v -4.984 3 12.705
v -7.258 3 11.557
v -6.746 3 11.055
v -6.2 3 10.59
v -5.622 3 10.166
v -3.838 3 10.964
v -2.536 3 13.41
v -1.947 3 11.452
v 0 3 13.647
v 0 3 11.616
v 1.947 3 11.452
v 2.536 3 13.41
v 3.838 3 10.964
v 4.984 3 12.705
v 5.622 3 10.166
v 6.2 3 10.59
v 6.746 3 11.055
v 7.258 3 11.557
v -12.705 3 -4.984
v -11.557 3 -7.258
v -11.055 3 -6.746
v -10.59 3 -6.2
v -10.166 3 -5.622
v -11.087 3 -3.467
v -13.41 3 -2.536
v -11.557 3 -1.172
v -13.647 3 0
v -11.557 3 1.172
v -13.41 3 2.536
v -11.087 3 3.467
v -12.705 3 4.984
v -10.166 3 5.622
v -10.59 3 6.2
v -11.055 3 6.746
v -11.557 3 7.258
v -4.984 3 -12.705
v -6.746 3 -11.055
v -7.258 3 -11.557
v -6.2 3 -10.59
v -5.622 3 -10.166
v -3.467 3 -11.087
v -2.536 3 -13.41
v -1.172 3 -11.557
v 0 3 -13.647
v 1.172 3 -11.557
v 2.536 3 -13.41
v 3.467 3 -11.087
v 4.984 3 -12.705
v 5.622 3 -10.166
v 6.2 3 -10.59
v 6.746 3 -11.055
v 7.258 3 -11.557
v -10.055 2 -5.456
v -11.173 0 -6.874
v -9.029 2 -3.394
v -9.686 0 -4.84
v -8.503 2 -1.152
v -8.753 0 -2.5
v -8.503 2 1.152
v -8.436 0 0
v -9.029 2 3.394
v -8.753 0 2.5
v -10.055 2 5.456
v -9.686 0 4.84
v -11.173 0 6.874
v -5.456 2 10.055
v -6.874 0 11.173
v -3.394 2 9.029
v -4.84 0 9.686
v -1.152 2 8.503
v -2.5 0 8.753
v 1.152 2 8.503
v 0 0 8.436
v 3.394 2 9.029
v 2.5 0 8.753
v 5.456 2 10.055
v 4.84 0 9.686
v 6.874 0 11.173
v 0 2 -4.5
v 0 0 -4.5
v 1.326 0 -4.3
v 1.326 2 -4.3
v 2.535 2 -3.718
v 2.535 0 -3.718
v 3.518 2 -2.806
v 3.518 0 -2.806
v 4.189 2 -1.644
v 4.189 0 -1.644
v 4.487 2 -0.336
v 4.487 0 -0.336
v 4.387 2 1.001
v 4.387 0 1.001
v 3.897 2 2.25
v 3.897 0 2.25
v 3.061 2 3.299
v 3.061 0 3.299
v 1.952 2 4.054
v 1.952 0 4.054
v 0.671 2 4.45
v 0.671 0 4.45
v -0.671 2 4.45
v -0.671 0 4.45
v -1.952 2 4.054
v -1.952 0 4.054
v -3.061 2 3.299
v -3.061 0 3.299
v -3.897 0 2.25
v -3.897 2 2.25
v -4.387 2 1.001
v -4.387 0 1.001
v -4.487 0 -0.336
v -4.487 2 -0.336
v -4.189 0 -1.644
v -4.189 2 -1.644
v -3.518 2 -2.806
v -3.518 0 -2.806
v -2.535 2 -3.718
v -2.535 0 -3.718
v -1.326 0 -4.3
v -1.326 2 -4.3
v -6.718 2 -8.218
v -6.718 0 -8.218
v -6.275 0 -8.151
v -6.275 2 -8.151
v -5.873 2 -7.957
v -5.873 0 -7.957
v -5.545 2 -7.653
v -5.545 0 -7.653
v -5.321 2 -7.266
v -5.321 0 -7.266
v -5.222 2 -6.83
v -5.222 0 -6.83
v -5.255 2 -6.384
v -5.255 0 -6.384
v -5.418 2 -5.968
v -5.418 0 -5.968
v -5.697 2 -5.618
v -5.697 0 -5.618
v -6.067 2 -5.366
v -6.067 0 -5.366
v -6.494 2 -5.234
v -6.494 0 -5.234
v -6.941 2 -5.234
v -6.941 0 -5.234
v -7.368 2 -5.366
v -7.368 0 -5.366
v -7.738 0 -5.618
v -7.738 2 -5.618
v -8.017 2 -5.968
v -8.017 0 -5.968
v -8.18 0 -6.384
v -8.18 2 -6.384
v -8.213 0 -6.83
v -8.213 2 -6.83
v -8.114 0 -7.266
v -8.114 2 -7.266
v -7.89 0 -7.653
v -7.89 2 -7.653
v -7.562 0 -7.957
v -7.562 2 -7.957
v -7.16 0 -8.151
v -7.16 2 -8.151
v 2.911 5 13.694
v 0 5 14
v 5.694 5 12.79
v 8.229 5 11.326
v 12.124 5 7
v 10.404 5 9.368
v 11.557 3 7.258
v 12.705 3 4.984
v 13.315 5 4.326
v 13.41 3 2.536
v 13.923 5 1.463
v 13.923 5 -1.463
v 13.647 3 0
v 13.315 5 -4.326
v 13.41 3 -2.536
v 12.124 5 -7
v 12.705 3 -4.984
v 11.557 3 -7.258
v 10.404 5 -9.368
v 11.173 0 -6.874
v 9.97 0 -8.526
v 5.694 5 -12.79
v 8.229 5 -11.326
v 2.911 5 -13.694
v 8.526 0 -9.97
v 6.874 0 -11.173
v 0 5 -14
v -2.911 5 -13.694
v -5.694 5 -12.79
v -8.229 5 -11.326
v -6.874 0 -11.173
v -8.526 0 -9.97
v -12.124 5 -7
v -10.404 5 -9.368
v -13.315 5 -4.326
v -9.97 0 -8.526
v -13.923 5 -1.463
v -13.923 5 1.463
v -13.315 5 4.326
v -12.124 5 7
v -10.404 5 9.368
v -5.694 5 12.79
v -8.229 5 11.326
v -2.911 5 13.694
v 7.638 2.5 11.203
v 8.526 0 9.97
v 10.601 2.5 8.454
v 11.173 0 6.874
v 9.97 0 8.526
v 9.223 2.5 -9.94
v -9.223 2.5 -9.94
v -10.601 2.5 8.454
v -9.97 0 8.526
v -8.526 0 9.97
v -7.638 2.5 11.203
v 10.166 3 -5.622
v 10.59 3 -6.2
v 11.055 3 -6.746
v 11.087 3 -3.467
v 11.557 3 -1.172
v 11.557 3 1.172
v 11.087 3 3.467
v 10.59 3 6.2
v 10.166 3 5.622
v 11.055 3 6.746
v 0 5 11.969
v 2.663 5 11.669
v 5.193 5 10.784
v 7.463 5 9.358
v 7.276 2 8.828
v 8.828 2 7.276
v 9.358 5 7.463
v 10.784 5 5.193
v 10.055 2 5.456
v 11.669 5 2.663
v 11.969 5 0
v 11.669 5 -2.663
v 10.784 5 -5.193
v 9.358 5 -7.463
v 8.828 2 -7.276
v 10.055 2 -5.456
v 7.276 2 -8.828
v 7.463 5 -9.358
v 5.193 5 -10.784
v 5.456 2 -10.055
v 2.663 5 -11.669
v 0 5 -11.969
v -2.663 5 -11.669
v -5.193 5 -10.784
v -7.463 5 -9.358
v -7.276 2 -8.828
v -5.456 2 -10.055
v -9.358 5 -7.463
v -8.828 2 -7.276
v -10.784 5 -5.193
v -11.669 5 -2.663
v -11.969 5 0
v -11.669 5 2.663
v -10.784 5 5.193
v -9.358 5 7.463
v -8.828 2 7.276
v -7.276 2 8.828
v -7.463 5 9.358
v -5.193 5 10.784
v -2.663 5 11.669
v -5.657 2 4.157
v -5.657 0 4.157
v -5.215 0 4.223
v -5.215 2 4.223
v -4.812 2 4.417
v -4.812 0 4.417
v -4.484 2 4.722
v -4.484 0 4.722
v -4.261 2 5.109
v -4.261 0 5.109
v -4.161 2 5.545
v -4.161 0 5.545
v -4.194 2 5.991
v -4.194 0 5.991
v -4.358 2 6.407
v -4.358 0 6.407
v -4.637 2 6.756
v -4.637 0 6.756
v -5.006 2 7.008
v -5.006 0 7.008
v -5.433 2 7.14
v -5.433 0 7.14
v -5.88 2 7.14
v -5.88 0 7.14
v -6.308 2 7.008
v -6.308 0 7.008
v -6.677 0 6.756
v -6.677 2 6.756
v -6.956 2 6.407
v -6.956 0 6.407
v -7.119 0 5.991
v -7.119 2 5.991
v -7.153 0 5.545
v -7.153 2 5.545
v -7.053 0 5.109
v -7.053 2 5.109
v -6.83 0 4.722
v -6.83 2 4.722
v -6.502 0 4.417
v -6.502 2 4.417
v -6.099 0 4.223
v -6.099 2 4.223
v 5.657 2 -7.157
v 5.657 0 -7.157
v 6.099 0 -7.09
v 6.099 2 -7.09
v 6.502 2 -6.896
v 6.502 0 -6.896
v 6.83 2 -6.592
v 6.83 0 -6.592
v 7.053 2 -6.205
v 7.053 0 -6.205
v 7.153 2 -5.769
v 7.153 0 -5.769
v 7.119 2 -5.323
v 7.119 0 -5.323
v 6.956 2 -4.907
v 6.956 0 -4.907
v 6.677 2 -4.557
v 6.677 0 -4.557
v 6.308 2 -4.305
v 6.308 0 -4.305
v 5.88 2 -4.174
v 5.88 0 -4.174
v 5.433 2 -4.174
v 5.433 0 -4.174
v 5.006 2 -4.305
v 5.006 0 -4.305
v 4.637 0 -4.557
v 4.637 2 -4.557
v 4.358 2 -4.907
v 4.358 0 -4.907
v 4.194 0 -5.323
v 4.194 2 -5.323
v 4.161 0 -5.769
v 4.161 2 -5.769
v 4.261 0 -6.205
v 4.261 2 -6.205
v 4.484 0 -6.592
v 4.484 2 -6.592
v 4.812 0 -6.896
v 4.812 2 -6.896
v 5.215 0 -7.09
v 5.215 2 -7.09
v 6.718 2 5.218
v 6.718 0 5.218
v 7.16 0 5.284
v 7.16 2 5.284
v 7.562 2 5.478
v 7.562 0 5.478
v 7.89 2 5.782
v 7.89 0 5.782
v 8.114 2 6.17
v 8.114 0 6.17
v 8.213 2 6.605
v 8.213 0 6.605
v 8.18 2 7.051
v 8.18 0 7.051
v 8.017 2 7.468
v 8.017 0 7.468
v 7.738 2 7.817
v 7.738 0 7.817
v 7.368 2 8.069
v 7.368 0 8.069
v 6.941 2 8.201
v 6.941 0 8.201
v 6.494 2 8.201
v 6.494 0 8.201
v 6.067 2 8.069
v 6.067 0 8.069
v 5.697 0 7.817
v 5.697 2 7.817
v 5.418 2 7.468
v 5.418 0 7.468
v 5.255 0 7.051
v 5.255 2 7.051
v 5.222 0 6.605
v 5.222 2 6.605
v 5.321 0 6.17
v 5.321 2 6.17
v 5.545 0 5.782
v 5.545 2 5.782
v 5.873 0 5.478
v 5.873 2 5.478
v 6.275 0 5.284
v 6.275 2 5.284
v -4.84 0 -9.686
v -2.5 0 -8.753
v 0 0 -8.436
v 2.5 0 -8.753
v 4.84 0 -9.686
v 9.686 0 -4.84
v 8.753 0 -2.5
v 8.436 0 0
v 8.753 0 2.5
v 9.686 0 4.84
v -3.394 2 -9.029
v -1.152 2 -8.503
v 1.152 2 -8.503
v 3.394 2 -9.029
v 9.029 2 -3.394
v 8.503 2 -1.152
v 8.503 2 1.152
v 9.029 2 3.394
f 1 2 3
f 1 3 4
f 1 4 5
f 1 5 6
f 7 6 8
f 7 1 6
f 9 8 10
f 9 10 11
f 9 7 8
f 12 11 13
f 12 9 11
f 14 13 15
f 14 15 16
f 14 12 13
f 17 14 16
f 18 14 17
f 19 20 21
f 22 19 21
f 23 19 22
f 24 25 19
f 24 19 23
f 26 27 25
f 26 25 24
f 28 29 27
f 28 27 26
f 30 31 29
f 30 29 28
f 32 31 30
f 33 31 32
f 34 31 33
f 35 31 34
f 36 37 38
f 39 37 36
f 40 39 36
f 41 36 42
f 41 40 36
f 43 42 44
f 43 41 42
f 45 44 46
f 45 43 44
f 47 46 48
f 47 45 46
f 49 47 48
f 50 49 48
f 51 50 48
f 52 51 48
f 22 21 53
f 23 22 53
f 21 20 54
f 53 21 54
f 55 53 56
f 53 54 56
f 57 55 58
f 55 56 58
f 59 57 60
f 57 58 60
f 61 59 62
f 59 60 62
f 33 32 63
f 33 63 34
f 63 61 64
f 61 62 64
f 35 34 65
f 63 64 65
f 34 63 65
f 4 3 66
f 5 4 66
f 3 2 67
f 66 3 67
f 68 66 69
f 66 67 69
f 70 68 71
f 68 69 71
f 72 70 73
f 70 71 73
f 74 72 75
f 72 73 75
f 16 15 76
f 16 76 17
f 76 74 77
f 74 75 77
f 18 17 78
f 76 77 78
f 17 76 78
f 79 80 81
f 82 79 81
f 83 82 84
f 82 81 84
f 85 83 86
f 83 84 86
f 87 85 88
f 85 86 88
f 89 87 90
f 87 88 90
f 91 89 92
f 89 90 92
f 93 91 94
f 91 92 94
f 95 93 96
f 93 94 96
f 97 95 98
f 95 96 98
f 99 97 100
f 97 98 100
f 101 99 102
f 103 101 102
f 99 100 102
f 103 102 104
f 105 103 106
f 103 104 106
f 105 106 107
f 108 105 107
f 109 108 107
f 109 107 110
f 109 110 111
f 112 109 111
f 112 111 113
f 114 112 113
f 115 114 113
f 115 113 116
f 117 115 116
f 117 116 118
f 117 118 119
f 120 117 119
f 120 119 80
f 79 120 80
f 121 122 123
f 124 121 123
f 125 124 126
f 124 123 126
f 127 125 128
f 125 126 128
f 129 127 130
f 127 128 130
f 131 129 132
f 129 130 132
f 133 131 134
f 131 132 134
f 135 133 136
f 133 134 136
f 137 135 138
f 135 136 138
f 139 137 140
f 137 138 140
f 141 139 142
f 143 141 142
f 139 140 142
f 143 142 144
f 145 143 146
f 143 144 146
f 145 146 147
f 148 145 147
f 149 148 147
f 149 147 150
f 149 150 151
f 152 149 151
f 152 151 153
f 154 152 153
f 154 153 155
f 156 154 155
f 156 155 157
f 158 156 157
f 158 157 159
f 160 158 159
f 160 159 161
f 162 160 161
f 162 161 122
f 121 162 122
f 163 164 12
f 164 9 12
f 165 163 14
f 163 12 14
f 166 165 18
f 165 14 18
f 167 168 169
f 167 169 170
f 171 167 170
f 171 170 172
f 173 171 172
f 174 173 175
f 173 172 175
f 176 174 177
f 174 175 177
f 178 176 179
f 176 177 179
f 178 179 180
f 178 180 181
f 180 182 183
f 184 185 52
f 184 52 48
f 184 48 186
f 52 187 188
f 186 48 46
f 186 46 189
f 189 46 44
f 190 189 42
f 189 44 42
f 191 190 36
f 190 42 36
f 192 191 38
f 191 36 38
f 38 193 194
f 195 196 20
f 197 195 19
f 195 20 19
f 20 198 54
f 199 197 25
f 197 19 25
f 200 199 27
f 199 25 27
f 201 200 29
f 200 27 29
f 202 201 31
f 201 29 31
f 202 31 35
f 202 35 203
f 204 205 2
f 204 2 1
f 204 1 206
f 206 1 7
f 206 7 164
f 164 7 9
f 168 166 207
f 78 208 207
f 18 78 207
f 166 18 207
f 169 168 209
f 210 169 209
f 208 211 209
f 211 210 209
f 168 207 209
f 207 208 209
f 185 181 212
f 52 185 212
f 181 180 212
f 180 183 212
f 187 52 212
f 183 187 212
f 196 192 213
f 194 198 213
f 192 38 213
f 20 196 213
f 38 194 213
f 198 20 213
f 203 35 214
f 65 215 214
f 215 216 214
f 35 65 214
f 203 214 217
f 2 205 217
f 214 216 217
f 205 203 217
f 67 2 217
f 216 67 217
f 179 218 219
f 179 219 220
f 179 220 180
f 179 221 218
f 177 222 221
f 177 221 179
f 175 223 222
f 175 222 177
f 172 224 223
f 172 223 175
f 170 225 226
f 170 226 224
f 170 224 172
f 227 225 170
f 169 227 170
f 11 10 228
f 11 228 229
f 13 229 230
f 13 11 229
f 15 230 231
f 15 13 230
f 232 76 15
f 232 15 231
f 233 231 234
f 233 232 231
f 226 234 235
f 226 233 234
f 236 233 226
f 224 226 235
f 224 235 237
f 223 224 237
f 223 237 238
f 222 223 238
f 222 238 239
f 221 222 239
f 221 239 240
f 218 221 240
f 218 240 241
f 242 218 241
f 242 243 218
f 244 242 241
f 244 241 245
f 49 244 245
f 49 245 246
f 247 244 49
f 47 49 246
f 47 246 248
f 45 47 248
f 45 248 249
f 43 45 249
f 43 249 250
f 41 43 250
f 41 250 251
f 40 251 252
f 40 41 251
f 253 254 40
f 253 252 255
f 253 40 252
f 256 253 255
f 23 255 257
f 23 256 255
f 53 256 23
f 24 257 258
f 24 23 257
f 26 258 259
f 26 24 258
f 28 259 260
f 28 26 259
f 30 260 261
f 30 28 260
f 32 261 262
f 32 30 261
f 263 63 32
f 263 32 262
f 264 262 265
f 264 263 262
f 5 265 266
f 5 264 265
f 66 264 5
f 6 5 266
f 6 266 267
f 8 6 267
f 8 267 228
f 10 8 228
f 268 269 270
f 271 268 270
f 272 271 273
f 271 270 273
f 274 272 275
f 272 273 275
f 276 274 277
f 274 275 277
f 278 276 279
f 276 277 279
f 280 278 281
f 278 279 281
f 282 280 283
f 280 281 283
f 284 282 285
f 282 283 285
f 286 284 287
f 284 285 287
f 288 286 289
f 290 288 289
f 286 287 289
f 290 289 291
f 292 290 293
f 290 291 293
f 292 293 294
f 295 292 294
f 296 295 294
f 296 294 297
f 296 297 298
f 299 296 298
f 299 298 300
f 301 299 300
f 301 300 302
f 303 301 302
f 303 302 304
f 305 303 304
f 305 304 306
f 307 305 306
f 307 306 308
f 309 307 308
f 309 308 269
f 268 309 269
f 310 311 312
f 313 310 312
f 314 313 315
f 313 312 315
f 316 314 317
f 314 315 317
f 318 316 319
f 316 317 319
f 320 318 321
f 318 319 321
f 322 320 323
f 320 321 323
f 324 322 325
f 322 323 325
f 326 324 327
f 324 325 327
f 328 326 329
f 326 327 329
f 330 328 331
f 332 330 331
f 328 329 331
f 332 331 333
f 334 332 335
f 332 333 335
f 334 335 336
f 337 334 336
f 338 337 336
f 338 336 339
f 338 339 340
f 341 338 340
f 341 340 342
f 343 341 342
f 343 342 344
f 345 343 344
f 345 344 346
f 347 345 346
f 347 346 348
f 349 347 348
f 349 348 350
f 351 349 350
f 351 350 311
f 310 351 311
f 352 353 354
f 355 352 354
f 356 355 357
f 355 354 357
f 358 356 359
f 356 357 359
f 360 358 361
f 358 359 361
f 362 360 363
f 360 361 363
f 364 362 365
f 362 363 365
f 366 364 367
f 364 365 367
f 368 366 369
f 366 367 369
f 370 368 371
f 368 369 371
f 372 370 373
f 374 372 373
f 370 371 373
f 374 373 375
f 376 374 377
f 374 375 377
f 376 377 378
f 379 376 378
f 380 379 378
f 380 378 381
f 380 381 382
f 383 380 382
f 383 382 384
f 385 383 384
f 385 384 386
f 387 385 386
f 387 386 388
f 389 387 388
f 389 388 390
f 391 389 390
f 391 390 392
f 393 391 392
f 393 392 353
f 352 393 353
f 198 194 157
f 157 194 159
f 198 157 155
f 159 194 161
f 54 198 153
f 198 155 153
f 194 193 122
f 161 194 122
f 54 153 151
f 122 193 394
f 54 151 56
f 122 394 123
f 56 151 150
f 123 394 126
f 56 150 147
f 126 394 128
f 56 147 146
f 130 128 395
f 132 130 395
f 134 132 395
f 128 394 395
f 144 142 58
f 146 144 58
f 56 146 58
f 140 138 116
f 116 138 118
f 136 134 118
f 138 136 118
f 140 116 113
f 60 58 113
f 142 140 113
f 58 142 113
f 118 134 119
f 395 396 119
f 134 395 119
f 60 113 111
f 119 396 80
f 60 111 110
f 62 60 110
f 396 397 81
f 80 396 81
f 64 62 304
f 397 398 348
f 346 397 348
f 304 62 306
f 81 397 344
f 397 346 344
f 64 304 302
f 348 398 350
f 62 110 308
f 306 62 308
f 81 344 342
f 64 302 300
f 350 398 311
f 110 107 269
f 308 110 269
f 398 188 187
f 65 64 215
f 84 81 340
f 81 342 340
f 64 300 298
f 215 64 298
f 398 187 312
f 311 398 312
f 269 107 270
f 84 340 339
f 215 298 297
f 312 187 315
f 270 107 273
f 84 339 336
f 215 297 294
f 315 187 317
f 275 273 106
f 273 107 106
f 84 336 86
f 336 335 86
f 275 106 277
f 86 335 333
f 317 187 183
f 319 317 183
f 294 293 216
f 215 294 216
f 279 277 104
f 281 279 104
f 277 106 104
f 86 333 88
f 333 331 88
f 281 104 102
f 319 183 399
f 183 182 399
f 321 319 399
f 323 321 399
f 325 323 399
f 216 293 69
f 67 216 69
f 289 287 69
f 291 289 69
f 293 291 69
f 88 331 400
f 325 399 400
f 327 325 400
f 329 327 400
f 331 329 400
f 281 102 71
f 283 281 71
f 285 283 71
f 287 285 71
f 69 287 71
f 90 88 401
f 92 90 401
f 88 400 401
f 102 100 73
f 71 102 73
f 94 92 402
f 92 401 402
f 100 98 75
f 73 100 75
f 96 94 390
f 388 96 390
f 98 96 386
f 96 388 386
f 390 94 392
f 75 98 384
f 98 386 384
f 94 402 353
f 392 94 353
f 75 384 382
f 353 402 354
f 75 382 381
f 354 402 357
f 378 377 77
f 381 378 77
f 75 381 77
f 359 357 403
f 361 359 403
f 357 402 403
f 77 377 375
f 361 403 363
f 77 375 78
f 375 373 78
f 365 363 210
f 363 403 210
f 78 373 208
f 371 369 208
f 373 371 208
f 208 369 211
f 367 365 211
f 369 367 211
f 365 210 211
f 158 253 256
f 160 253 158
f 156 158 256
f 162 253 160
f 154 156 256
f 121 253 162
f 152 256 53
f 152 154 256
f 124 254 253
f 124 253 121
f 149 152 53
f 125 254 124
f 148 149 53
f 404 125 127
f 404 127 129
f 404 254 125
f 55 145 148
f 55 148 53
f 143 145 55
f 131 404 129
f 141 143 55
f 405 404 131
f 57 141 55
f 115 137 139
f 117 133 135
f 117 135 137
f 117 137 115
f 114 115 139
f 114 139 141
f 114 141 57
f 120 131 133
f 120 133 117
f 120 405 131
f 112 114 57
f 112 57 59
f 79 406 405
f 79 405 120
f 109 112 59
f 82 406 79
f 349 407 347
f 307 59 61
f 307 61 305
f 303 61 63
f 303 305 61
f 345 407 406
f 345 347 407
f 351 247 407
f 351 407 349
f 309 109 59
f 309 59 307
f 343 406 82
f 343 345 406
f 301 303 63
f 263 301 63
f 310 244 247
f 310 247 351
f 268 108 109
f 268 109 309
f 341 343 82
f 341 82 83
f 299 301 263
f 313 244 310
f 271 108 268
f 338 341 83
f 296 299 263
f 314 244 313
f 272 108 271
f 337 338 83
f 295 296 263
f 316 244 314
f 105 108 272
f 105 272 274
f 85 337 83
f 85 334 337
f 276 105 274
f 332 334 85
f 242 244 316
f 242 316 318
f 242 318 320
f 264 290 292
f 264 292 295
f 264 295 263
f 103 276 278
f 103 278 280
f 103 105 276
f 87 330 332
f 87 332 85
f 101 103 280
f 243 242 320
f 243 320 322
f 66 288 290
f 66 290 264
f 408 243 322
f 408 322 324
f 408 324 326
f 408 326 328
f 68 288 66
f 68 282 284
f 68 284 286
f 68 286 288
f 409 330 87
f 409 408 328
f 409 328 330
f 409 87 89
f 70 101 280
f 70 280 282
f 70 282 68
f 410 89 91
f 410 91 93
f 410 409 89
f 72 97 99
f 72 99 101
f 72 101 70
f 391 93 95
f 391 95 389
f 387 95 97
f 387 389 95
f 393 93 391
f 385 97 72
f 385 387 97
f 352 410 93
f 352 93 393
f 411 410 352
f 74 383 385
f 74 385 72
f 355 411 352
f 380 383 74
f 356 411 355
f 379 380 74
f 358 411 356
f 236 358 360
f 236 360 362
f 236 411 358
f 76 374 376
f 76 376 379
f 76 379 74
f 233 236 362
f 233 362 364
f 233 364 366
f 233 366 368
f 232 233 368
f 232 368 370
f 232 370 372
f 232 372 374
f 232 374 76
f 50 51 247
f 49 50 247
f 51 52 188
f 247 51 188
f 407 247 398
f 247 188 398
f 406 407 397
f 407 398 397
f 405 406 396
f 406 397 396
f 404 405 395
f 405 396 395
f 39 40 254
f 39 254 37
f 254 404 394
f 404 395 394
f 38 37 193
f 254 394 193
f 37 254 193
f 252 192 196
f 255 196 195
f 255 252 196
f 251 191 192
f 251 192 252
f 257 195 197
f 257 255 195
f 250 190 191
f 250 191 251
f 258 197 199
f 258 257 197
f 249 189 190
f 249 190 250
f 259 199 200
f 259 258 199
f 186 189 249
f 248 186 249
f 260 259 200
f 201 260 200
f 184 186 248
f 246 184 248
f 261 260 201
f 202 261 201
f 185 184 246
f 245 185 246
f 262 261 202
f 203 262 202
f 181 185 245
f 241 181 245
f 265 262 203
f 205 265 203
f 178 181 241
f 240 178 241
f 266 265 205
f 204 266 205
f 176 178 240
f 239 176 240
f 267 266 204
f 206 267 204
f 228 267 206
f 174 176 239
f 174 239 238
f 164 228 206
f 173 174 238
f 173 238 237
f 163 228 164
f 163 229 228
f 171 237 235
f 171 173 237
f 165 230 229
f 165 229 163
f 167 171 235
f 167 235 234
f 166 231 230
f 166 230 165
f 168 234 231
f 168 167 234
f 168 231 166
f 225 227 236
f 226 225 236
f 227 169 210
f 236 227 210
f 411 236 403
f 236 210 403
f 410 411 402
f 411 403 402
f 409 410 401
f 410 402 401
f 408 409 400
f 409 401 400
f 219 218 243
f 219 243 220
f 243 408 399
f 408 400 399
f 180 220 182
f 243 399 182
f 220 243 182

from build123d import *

# Parameters (mm, degrees)
IZIM1_R                     = 14
Y_KSEKLIK_EKSTR_ZYON1_DEPTH = 5
PAH1_SIZE                   = 5
PAH1_SIZE_2                 = 0.881634904
BO_ALTMA1_T                 = -2
IZIM2_R                     = 4.5
KES_EKSTR_ZYON1_DEPTH       = 3
KES_EKSTR_ZYON2_REACH       = 22.421
IZIM3_R                     = 1.5


with BuildPart() as part:
    # Çizim1 → Yükseklik-Ekstrüzyon1 (new body)
    with BuildSketch(Plane(origin=(0, 0, 0), x_dir=(1, 0, 0), z_dir=(0, 1, 0))):
        with Locations(Location((0, 0, 0), (0, 0, 270))):
            Circle(IZIM1_R)
    extrude(amount=Y_KSEKLIK_EKSTR_ZYON1_DEPTH)

    # Pah1
    # the kernel refuses this chamfer: 5, 0.881634904 mm, written as the material it takes off along each edge
    with BuildSketch(Plane(origin=(0, 0, 0), x_dir=(0, 0, 1), z_dir=(-1, 0, 0))) as pah1_piece_1:
        Polygon((14, PAH1_SIZE), (14 - PAH1_SIZE_2, 0), (14, 0), align=None)
    revolve(axis=Axis((0, 0, 0), (0, 1, 0)), mode=Mode.SUBTRACT)

    # İç Boşaltma1
    bo_altma1_openings = [part.faces().sort_by_distance(p)[0] for p in [
        (0, 5, 0),
    ]]
    offset(amount=BO_ALTMA1_T, openings=bo_altma1_openings, kind=Kind.INTERSECTION)

    # Çizim2 → Kes-Ekstrüzyon1 (cut)
    with BuildSketch(Plane.XZ):
        with BuildLine():
            ThreePointArc((-7.5, 11.821590418), (0, 8.435968695), (7.5, 11.821590418))
            ThreePointArc((7.5, 11.821590418), (0, 14), (-7.5, 11.821590418))
        make_face()
        with Locations(Location((0, 0, 0), (0, 0, 270))):
            Circle(IZIM2_R)
        with BuildLine():
            ThreePointArc((11.821590418, -7.5), (14, 0), (11.821590418, 7.5))
            ThreePointArc((11.821590418, 7.5), (8.435968695, 0), (11.821590418, -7.5))
        make_face()
        with BuildLine():
            ThreePointArc((-7.5, -11.821590418), (0, -14), (7.5, -11.821590418))
            ThreePointArc((7.5, -11.821590418), (0, -8.435968695), (-7.5, -11.821590418))
        make_face()
        with BuildLine():
            ThreePointArc((-11.821590418, 7.5), (-14, 0), (-11.821590418, -7.5))
            ThreePointArc((-11.821590418, -7.5), (-8.435968695, 0), (-11.821590418, 7.5))
        make_face()
    extrude(amount=-KES_EKSTR_ZYON1_DEPTH, mode=Mode.SUBTRACT)

    # Çizim3 → Kes-Ekstrüzyon2 (cut, up to next)
    with BuildSketch(Plane.XZ, mode=Mode.PRIVATE) as kes_ekstr_zyon2_sk1:
        with Locations(Location((-5.656854249, 5.656854249, 0), (0, 0, 270))):
            Circle(IZIM3_R)
    kes_ekstr_zyon2_tool1 = extrude(kes_ekstr_zyon2_sk1.sketch, amount=-KES_EKSTR_ZYON2_REACH, mode=Mode.PRIVATE) & part.part
    # Çizim3 → Kes-Ekstrüzyon2 (cut, up to next)
    with BuildSketch(Plane.XZ, mode=Mode.PRIVATE) as kes_ekstr_zyon2_sk2:
        with Locations(Location((6.717514421, 6.717514421, 0), (0, 0, 270))):
            Circle(IZIM3_R)
    kes_ekstr_zyon2_tool2 = extrude(kes_ekstr_zyon2_sk2.sketch, amount=-KES_EKSTR_ZYON2_REACH, mode=Mode.PRIVATE) & part.part
    # Çizim3 → Kes-Ekstrüzyon2 (cut, up to next)
    with BuildSketch(Plane.XZ, mode=Mode.PRIVATE) as kes_ekstr_zyon2_sk3:
        with Locations(Location((5.656854249, -5.656854249, 0), (0, 0, 270))):
            Circle(IZIM3_R)
    kes_ekstr_zyon2_tool3 = extrude(kes_ekstr_zyon2_sk3.sketch, amount=-KES_EKSTR_ZYON2_REACH, mode=Mode.PRIVATE) & part.part
    # Çizim3 → Kes-Ekstrüzyon2 (cut, up to next)
    with BuildSketch(Plane.XZ, mode=Mode.PRIVATE) as kes_ekstr_zyon2_sk4:
        with Locations(Location((-6.717514421, -6.717514421, 0), (0, 0, 270))):
            Circle(IZIM3_R)
    kes_ekstr_zyon2_tool4 = extrude(kes_ekstr_zyon2_sk4.sketch, amount=-KES_EKSTR_ZYON2_REACH, mode=Mode.PRIVATE) & part.part
    add(kes_ekstr_zyon2_tool1.solids().sort_by_distance((-5.656854, 0, 5.656854))[0], mode=Mode.SUBTRACT)
    add(kes_ekstr_zyon2_tool2.solids().sort_by_distance((6.717514, 0, 6.717514))[0], mode=Mode.SUBTRACT)
    add(kes_ekstr_zyon2_tool3.solids().sort_by_distance((5.656854, 0, -5.656854))[0], mode=Mode.SUBTRACT)
    add(kes_ekstr_zyon2_tool4.solids().sort_by_distance((-6.717514, 0, -6.717514))[0], mode=Mode.SUBTRACT)


solid = part.part
